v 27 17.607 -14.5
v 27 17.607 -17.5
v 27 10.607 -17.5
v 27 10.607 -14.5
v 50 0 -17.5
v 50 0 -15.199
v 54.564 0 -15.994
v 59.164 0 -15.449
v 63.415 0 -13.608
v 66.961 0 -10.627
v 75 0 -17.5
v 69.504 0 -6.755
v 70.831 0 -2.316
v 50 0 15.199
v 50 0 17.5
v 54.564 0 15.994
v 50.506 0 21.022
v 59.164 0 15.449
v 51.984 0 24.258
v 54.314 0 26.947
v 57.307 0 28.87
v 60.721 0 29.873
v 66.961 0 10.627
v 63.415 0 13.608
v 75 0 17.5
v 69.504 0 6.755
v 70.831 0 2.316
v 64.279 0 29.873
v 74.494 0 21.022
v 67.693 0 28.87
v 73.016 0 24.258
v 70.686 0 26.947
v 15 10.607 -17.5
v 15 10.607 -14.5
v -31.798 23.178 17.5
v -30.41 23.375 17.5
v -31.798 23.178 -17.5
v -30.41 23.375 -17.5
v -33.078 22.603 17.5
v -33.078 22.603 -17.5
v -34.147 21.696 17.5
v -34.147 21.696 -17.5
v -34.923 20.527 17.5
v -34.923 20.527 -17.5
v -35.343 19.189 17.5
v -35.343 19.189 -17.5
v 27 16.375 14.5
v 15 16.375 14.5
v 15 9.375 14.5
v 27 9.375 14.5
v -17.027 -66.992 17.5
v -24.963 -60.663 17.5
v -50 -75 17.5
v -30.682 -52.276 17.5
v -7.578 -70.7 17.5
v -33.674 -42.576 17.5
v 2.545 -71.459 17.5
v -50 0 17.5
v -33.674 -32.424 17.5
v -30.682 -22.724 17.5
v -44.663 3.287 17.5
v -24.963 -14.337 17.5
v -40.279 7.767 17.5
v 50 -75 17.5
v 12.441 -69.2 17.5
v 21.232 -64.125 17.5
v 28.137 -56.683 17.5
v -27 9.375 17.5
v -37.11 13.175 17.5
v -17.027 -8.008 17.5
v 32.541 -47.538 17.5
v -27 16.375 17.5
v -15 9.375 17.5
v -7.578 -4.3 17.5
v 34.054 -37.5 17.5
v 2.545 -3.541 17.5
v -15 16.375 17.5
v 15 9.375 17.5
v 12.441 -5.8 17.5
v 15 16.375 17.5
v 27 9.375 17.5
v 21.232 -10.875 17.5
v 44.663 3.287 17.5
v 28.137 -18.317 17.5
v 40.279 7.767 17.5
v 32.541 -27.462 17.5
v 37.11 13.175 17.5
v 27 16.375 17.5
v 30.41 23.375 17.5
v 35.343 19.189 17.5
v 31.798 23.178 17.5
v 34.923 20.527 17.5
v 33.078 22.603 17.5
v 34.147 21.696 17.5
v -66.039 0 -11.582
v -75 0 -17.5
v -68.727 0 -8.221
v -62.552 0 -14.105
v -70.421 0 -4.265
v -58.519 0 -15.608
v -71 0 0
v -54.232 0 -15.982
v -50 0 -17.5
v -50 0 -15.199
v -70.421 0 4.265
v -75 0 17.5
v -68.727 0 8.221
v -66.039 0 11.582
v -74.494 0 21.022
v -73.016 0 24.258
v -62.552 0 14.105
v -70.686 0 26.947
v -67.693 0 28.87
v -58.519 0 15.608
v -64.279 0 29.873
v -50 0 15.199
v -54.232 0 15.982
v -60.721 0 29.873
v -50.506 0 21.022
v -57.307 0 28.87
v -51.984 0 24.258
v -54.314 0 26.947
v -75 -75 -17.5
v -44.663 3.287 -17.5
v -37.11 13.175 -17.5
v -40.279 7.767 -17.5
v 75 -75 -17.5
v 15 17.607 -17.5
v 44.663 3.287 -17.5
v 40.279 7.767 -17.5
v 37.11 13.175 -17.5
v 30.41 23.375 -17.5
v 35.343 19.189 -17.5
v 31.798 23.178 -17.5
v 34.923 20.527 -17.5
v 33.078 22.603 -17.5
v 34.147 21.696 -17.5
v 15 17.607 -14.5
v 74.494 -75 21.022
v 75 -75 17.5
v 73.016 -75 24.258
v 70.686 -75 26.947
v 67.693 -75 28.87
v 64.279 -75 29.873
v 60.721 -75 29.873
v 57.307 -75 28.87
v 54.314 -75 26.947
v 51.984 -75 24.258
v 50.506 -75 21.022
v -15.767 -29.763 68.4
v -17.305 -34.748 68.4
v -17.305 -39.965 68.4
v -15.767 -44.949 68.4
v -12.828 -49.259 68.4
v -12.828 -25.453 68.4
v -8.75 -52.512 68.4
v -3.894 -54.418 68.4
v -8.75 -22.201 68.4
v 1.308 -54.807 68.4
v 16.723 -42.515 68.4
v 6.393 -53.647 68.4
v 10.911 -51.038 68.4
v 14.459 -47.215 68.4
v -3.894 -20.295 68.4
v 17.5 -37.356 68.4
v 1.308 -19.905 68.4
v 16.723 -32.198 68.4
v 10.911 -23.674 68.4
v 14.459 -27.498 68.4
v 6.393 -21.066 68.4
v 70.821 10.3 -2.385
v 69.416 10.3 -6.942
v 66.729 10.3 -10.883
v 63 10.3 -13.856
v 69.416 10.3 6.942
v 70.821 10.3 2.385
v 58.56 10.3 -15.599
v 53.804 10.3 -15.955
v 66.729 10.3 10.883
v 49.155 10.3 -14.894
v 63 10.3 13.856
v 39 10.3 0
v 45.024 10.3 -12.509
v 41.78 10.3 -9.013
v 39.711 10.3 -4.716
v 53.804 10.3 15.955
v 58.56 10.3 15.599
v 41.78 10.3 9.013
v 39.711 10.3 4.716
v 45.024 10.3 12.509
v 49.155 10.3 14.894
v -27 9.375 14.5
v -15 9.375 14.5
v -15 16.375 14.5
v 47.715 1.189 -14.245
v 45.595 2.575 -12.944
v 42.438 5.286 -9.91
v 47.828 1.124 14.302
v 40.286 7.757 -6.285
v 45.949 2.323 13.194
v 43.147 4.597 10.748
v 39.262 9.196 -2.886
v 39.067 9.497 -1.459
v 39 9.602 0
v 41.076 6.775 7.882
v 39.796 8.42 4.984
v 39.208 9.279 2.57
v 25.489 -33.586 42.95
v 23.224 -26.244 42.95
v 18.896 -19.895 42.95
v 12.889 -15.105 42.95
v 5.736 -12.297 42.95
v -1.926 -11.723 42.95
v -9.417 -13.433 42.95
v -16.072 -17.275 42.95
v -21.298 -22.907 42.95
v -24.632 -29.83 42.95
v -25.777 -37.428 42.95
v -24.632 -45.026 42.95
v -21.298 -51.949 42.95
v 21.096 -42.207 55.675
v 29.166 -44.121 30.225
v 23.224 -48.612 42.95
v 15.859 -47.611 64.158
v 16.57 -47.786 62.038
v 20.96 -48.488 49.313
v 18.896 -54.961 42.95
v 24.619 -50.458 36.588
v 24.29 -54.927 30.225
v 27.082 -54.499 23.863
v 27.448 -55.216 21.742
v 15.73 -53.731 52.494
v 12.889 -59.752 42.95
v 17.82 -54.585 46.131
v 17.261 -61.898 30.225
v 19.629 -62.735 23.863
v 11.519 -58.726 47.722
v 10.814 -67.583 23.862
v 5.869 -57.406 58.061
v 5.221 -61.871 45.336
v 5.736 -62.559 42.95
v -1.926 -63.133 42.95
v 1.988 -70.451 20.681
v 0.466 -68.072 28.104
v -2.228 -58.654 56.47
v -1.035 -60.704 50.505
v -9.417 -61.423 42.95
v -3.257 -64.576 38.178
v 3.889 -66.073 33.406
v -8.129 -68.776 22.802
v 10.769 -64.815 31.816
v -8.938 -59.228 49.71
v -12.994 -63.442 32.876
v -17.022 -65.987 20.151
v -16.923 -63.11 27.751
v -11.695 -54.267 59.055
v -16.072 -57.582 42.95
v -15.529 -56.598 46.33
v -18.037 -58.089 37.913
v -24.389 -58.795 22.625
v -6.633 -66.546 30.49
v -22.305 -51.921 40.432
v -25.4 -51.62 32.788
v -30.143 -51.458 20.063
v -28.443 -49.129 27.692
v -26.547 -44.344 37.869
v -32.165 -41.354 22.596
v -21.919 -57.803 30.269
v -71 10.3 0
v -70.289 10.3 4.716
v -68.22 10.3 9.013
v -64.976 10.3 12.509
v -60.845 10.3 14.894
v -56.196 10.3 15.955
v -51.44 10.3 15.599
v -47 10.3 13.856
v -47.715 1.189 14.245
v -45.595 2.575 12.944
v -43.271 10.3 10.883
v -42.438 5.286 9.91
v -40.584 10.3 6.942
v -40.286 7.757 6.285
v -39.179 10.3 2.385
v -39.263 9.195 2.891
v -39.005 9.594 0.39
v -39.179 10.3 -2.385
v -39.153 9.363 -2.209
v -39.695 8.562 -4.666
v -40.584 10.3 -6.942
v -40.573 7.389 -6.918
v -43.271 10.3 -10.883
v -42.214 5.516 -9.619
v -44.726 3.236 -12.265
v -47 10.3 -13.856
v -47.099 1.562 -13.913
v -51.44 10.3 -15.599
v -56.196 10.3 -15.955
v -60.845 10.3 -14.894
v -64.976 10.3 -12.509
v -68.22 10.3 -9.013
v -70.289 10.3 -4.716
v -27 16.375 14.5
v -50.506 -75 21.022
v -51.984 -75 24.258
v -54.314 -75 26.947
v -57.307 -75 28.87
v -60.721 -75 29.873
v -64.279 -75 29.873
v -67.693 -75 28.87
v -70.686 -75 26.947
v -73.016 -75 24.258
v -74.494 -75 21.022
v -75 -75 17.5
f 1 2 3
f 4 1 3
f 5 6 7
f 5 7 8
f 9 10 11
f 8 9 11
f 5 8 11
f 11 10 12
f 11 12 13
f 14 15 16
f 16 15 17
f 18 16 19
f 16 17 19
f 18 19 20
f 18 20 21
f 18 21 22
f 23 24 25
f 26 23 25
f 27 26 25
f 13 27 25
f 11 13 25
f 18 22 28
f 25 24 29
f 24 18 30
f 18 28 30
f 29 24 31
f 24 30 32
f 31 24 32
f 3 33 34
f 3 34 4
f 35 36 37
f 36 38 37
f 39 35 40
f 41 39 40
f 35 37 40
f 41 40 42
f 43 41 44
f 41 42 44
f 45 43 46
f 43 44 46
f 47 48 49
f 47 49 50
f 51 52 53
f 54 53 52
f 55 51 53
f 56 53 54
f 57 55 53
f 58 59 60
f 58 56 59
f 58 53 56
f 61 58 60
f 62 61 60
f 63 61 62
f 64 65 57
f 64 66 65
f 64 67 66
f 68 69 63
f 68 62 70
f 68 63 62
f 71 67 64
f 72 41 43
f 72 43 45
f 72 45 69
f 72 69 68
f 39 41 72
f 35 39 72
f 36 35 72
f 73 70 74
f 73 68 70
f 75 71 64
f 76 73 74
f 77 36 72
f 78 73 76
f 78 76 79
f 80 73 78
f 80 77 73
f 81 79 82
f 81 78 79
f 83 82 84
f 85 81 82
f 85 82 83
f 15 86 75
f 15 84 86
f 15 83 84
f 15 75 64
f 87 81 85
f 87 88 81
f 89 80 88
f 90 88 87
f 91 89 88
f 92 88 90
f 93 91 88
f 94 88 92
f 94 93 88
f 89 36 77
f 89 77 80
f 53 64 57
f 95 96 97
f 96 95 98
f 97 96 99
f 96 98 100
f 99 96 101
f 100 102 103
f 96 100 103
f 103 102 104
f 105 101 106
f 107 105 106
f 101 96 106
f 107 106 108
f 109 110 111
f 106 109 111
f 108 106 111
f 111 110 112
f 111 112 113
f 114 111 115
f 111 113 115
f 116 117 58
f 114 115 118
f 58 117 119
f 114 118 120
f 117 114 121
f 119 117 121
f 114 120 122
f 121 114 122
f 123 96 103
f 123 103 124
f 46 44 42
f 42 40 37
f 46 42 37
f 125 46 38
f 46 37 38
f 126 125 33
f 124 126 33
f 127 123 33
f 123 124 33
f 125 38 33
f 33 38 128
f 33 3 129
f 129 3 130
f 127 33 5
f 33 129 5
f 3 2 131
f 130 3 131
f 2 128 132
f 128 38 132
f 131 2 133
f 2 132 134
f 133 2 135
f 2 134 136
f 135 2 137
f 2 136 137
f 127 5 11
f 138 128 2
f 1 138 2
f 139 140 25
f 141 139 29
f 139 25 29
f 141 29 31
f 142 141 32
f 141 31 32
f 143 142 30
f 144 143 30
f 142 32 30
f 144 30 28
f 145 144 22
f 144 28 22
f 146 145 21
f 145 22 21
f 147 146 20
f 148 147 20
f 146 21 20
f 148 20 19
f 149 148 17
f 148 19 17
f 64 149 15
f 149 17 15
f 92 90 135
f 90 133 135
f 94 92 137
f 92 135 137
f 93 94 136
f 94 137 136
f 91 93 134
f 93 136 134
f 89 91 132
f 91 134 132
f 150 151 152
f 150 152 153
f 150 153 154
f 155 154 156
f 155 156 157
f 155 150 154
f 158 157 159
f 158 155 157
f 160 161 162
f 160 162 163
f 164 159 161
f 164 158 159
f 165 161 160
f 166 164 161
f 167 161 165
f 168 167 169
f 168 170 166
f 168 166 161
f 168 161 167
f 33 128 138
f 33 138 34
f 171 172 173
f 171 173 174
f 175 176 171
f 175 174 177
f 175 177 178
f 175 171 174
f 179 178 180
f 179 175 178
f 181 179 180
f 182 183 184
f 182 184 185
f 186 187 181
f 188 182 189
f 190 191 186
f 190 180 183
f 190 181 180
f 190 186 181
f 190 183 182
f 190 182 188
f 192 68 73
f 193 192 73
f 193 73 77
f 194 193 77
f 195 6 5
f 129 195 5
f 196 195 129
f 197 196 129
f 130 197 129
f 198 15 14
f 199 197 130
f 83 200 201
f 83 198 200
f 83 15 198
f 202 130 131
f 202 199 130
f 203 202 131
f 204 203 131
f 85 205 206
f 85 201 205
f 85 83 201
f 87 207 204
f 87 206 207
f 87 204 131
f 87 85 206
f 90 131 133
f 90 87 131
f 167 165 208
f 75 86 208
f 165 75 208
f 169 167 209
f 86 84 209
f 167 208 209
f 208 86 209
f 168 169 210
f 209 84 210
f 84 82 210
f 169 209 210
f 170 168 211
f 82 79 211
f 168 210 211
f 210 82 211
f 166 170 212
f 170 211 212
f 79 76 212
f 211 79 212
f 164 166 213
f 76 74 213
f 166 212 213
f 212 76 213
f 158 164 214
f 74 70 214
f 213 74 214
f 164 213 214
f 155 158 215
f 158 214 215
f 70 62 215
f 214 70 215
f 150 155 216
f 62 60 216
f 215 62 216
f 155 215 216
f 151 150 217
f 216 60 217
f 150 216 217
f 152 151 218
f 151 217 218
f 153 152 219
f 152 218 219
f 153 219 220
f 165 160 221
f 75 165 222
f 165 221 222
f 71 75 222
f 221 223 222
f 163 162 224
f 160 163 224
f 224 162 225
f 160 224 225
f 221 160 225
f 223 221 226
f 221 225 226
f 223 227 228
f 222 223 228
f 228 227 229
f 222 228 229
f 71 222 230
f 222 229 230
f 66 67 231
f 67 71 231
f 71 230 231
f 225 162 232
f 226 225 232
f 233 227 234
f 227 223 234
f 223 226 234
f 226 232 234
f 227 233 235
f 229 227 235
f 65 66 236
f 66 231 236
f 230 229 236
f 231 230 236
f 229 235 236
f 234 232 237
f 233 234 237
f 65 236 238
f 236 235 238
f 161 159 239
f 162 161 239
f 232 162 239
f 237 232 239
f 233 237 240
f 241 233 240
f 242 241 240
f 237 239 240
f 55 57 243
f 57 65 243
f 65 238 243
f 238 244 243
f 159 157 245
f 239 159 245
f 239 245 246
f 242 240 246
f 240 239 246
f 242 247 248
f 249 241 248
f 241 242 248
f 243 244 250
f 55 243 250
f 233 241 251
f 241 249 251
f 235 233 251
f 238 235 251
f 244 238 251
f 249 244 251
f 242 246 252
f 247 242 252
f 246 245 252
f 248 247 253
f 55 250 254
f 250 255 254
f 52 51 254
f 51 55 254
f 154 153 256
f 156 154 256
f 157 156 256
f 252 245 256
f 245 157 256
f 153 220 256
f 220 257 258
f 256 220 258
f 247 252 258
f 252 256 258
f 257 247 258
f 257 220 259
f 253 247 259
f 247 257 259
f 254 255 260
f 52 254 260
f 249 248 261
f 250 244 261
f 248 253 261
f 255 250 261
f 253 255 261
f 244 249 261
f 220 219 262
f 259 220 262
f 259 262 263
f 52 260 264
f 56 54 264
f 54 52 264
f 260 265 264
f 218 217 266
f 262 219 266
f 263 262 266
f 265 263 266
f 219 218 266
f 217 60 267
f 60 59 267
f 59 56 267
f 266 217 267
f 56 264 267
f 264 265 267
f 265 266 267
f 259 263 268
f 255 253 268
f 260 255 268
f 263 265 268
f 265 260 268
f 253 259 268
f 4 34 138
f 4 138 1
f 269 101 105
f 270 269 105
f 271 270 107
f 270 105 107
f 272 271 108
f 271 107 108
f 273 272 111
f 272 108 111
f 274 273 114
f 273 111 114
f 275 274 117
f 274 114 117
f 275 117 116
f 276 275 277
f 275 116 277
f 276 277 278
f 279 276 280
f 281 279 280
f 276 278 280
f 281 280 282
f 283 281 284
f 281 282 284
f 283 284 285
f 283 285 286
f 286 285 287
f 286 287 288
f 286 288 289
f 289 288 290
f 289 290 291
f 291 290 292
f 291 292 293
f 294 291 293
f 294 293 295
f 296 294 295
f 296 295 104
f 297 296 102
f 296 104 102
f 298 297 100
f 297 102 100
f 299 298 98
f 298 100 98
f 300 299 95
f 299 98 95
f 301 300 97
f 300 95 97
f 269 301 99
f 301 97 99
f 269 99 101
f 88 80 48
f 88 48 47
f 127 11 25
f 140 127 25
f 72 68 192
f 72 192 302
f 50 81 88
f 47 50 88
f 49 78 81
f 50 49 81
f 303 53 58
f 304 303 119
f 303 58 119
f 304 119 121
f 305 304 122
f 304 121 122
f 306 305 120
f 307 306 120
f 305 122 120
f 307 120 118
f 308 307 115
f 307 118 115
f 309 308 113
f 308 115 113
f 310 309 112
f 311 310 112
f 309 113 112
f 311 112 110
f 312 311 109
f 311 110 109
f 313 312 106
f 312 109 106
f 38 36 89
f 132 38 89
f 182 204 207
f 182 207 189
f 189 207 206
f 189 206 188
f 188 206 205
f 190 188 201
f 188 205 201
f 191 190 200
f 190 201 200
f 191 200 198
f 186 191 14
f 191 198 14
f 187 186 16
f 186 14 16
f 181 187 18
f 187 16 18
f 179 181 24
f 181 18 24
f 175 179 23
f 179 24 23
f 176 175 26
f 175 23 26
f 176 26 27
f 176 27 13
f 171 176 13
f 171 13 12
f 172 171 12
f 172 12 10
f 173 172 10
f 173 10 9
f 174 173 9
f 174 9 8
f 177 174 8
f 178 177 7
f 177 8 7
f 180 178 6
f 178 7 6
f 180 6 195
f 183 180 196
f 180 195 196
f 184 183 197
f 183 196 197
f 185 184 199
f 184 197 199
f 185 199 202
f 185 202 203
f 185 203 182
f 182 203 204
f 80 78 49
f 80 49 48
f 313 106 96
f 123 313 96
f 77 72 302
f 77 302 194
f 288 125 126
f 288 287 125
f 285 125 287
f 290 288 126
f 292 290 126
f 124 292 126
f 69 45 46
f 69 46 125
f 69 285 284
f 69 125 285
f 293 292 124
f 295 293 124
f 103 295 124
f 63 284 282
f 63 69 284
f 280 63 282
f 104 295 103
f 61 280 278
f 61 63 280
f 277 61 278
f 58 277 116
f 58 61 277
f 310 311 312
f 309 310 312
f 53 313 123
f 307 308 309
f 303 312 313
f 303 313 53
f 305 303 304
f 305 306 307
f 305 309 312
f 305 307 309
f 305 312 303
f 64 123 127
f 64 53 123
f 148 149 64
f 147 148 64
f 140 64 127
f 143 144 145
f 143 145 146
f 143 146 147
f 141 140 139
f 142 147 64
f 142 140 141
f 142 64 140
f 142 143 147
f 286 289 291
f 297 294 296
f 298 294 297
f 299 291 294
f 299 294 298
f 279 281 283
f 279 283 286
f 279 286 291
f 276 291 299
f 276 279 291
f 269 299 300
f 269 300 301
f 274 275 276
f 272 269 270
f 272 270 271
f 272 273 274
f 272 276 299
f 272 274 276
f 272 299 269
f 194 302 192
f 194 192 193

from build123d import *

# Parameters (mm, degrees)
F1_DEPTH  = 75
F3_R      = 3.442956
F4_DEPTH  = 49.9
F5_R      = 17.5
F6_DEPTH  = 1
F6_FACE_R = 17.5
F2_R      = 34.054107
F8_W      = 70
F8_H      = 2.474771
F8_H_2    = 23.374684
F9_DEPTH  = 35
F10_R     = 5
F11_R     = 16
F12_DEPTH = 10.3
F13_W     = 12
F13_H     = 7
F14_DEPTH = 3
F15_W     = 12
F15_H     = 7
F16_DEPTH = 3


with BuildPart() as f1:
    # F0 (on Front) → F1 (new body)
    with BuildSketch(Plane.XZ):
        Polygon((75, -17.5), (75, 17.5), (50, 17.5), (-50, 17.5), (-75, 17.5), (-75, -17.5), align=None)
        with BuildLine():
            Line((50, 17.5), (75, 17.5))
            ThreePointArc((75, 17.5), (62.5, 30), (50, 17.5))
        make_face()
        with BuildLine():
            Line((-75, 17.5), (-50, 17.5))
            ThreePointArc((-50, 17.5), (-62.5, 30), (-75, 17.5))
        make_face()
    extrude(amount=F1_DEPTH)

    # F3 (on face) → F4 (join)
    with BuildSketch(Plane.XY.offset(17.5)):
        with Locations((0, -37.356421)):
            Circle(F3_R)
    extrude(amount=F4_DEPTH)

    # F5 (on face) → F6 (join)
    with BuildSketch(Plane.XY.offset(67.4)):
        with Locations((0, -37.356421)):
            Circle(F5_R)
    extrude(amount=F6_DEPTH)

    # F6_face (on face) → F7 section 0
    with BuildSketch(Plane(origin=(0, -37.356421, 68.4), x_dir=(1, 0, 0), z_dir=(0, 0, 1))):
        Circle(F6_FACE_R)
    # F2 (on face) → F7 section 1
    with BuildSketch(Plane.XY.offset(17.5)):
        with Locations((0, -37.5)):
            Circle(F2_R)
    loft()

    # F8 (on face) → F9 (join)
    with BuildSketch(Plane.XY.offset(17.5)):
        with Locations((0, -1.237386)):
            Rectangle(F8_W, F8_H)
        with BuildLine():
            Line((-50, 0), (-35, 0))
            Line((-35, 0), (-35, 23.374684))
            ThreePointArc((-35, 23.374684), (-39.072516, 9.487857), (-50, 0))
        make_face()
        with Locations((0, 11.687342)):
            Rectangle(F8_W, F8_H_2)
        with BuildLine():
            Line((35, 23.374684), (35, 0))
            Line((35, 0), (50, 0))
            ThreePointArc((50, 0), (39.072516, 9.487857), (35, 23.374684))
        make_face()
    extrude(amount=-F9_DEPTH)

    # F10
    f10_edges = [f1.edges().sort_by_distance(p)[0] for p in [
        (35, 23.374684, 0),
        (-35, 23.374684, 0),
    ]]
    fillet(f10_edges, radius=F10_R)

    # F11 (on face) → F12 (join)
    with BuildSketch(Plane(origin=(0, 0, 0), x_dir=(-1, 0, 0), z_dir=(0, 1, 0))):
        with Locations((-55, 0)):
            Circle(F11_R)
        with Locations((55, 0)):
            Circle(F11_R)
    extrude(amount=F12_DEPTH)

    # F13 (on face) → F14 (cut)
    with BuildSketch(Plane.XY.offset(17.5)):
        with Locations((21, 12.874684)):
            Rectangle(F13_W, F13_H)
        with Locations((-21, 12.874684)):
            Rectangle(F13_W, F13_H)
    extrude(amount=-F14_DEPTH, mode=Mode.SUBTRACT)

    # F15 (on face) → F16 (cut)
    with BuildSketch(Plane(origin=(0, 0, -17.5), x_dir=(1, 0, 0), z_dir=(0, 0, -1))):
        with Locations((21, -14.107105)):
            Rectangle(F15_W, F15_H)
    extrude(amount=-F16_DEPTH, mode=Mode.SUBTRACT)


solid = f1.part
